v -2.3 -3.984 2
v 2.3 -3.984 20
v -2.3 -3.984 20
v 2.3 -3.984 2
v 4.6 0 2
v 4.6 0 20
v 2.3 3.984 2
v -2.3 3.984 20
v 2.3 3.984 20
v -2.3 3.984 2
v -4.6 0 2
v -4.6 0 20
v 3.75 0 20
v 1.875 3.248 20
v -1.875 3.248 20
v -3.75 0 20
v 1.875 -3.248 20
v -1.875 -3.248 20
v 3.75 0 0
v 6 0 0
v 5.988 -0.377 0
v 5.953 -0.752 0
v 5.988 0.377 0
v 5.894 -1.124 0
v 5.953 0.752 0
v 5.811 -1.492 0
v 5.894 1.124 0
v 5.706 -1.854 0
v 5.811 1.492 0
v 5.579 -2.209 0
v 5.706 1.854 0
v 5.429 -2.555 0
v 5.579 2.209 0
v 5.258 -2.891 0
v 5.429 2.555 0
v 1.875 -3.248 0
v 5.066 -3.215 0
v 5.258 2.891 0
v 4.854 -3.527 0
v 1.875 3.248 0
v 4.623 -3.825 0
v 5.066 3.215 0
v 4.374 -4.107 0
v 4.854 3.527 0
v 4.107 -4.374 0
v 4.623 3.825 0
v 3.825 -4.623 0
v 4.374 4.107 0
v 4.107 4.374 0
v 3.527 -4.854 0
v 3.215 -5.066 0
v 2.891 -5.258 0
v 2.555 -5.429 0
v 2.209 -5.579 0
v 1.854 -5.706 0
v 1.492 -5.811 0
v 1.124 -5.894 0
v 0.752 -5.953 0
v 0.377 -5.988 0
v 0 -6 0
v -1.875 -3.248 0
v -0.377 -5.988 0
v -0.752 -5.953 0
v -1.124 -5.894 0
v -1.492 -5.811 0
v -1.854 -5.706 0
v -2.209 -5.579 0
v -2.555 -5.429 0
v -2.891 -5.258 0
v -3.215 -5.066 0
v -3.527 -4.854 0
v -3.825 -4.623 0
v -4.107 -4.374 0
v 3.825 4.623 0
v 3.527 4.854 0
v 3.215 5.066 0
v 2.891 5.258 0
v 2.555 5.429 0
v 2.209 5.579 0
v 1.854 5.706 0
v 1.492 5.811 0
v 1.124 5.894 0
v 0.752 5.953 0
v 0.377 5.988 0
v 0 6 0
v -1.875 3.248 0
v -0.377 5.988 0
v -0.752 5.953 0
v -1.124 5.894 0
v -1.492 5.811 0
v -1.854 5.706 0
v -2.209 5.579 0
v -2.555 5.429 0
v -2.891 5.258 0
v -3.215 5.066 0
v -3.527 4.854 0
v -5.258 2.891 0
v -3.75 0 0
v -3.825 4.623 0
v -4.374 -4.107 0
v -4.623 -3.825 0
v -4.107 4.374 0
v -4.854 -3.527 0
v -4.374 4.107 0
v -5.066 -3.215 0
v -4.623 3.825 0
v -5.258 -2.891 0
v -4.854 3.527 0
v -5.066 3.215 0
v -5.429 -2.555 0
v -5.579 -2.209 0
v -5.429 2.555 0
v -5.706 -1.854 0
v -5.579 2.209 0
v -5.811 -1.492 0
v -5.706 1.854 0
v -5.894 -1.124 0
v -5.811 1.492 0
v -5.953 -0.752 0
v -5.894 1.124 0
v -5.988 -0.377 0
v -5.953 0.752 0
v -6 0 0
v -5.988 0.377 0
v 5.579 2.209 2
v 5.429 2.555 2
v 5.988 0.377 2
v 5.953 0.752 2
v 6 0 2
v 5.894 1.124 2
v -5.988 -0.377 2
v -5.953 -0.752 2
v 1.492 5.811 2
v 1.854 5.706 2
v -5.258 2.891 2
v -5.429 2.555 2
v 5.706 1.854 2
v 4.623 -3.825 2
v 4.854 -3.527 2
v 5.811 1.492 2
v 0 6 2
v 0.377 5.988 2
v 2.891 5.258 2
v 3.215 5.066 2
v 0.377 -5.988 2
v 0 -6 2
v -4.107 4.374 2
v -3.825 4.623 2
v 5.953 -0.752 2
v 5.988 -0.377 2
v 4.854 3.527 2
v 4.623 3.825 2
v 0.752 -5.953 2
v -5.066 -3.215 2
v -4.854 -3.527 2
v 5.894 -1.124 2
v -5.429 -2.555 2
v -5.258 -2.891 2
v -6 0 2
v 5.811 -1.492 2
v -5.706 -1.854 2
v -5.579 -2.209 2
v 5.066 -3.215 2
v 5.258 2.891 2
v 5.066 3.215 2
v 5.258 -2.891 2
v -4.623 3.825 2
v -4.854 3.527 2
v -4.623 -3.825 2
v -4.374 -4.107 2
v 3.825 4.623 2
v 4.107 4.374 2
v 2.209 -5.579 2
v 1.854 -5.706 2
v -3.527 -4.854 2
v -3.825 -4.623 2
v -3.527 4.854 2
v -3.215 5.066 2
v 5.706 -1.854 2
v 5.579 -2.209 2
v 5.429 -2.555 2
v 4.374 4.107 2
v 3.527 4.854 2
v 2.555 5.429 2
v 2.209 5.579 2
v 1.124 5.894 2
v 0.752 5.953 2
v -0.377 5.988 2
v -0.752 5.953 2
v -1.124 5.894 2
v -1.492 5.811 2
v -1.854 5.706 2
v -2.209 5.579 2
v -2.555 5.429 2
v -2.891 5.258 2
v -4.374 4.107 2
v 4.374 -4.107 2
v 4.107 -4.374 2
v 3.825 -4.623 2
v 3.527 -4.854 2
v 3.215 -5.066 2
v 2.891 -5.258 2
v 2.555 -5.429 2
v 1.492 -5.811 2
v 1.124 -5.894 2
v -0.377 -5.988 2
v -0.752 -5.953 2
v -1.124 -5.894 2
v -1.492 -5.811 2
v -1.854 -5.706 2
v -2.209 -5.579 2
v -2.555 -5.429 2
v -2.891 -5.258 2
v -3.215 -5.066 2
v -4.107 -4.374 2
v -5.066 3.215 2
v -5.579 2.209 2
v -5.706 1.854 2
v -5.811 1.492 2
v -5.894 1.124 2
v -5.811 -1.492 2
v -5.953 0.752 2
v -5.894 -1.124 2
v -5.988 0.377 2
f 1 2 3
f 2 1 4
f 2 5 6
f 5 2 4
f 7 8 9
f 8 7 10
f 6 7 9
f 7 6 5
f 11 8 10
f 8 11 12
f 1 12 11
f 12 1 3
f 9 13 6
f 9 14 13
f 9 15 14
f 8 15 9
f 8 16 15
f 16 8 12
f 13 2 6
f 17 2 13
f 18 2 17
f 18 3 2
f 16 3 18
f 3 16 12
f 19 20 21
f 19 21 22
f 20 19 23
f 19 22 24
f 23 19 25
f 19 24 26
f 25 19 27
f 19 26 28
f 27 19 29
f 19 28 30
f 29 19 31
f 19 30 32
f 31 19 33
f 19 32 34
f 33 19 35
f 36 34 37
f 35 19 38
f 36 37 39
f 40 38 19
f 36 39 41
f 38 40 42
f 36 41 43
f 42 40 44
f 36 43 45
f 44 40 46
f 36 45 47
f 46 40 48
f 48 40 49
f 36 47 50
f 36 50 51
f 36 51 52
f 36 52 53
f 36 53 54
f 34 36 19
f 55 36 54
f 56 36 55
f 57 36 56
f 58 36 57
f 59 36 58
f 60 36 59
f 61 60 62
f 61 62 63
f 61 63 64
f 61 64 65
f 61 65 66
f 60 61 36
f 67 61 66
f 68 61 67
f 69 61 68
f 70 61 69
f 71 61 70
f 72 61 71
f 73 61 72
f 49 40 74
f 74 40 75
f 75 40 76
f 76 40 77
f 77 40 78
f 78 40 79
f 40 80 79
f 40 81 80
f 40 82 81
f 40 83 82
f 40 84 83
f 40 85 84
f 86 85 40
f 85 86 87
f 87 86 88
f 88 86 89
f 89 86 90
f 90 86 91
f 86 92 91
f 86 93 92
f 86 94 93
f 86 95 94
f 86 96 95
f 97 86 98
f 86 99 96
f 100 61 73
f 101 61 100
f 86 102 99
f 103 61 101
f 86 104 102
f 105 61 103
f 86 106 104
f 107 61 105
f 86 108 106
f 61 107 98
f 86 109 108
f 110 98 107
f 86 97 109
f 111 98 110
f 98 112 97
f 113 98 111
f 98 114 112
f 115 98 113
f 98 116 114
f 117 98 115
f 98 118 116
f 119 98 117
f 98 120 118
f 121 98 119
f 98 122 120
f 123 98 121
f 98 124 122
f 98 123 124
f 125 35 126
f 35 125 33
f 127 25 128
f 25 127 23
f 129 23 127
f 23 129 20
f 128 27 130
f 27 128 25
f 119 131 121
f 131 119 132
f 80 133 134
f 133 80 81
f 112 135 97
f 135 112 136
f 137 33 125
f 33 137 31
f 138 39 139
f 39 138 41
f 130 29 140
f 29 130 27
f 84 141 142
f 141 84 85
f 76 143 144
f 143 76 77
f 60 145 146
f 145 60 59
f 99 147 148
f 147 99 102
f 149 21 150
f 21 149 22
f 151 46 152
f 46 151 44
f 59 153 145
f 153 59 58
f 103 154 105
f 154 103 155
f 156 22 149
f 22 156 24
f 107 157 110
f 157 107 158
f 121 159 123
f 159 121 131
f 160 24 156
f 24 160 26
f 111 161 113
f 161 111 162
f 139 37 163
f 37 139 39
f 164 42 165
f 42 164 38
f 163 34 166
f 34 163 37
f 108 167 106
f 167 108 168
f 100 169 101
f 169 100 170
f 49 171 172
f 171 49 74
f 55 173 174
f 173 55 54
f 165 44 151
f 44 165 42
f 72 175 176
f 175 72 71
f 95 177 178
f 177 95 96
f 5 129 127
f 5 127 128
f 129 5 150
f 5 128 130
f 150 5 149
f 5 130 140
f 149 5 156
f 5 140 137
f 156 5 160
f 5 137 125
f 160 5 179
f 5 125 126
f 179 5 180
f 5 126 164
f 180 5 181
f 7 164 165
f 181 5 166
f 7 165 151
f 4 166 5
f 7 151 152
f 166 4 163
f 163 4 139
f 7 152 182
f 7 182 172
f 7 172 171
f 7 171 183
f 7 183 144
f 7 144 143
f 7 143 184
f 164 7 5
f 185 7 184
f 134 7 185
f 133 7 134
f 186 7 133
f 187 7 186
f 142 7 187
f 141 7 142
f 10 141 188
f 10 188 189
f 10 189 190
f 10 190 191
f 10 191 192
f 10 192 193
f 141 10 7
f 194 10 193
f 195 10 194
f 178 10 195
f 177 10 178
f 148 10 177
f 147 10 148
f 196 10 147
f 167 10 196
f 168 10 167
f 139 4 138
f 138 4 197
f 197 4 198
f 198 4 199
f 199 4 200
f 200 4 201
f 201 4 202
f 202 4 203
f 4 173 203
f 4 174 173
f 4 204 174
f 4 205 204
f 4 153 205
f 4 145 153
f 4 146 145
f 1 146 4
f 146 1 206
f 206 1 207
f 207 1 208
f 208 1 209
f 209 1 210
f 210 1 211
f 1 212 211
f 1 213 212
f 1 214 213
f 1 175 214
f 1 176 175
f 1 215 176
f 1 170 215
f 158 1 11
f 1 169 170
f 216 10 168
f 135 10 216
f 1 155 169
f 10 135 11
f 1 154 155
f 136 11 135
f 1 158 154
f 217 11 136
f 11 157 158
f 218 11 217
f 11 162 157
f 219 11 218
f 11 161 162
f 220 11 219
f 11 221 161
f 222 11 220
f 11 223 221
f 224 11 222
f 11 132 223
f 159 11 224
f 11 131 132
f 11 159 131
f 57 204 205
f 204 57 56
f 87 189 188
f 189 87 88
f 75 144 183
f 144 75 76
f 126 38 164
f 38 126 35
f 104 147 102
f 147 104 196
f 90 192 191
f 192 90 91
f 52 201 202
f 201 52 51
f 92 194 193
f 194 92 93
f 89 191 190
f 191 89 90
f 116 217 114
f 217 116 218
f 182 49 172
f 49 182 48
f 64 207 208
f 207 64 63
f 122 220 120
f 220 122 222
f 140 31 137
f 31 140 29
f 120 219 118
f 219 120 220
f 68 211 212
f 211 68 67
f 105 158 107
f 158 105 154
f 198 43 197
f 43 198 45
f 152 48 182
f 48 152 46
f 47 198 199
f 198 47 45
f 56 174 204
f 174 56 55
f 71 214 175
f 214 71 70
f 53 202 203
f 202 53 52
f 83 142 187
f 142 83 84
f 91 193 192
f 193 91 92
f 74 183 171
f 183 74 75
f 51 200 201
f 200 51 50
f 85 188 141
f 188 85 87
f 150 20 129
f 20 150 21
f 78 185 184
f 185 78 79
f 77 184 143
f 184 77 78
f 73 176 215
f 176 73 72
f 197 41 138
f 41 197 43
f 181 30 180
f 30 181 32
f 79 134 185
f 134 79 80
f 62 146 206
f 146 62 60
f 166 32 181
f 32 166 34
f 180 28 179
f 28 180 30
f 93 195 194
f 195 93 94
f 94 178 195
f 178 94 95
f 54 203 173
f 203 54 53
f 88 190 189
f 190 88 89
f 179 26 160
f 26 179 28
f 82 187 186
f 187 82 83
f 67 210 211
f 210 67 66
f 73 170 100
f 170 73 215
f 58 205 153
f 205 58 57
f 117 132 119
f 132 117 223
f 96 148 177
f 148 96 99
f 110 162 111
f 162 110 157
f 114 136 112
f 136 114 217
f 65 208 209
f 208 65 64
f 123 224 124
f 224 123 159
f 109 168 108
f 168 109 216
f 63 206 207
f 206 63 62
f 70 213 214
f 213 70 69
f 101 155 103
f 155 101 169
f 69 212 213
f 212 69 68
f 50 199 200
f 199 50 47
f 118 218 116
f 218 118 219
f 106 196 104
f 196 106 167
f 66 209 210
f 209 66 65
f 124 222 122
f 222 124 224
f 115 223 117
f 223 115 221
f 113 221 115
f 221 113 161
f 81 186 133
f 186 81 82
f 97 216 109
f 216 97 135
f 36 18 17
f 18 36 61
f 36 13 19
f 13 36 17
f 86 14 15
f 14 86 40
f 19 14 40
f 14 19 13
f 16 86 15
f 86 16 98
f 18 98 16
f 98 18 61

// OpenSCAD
outer=4.6;
inner=3.75;
brim=6;

difference(){
    union(){
        cylinder(20,outer,outer,$fn=6);
        cylinder(2,brim,brim,$fn=100);
    }
    
    cylinder(100,inner,inner,$fn=6, center=true);
}
